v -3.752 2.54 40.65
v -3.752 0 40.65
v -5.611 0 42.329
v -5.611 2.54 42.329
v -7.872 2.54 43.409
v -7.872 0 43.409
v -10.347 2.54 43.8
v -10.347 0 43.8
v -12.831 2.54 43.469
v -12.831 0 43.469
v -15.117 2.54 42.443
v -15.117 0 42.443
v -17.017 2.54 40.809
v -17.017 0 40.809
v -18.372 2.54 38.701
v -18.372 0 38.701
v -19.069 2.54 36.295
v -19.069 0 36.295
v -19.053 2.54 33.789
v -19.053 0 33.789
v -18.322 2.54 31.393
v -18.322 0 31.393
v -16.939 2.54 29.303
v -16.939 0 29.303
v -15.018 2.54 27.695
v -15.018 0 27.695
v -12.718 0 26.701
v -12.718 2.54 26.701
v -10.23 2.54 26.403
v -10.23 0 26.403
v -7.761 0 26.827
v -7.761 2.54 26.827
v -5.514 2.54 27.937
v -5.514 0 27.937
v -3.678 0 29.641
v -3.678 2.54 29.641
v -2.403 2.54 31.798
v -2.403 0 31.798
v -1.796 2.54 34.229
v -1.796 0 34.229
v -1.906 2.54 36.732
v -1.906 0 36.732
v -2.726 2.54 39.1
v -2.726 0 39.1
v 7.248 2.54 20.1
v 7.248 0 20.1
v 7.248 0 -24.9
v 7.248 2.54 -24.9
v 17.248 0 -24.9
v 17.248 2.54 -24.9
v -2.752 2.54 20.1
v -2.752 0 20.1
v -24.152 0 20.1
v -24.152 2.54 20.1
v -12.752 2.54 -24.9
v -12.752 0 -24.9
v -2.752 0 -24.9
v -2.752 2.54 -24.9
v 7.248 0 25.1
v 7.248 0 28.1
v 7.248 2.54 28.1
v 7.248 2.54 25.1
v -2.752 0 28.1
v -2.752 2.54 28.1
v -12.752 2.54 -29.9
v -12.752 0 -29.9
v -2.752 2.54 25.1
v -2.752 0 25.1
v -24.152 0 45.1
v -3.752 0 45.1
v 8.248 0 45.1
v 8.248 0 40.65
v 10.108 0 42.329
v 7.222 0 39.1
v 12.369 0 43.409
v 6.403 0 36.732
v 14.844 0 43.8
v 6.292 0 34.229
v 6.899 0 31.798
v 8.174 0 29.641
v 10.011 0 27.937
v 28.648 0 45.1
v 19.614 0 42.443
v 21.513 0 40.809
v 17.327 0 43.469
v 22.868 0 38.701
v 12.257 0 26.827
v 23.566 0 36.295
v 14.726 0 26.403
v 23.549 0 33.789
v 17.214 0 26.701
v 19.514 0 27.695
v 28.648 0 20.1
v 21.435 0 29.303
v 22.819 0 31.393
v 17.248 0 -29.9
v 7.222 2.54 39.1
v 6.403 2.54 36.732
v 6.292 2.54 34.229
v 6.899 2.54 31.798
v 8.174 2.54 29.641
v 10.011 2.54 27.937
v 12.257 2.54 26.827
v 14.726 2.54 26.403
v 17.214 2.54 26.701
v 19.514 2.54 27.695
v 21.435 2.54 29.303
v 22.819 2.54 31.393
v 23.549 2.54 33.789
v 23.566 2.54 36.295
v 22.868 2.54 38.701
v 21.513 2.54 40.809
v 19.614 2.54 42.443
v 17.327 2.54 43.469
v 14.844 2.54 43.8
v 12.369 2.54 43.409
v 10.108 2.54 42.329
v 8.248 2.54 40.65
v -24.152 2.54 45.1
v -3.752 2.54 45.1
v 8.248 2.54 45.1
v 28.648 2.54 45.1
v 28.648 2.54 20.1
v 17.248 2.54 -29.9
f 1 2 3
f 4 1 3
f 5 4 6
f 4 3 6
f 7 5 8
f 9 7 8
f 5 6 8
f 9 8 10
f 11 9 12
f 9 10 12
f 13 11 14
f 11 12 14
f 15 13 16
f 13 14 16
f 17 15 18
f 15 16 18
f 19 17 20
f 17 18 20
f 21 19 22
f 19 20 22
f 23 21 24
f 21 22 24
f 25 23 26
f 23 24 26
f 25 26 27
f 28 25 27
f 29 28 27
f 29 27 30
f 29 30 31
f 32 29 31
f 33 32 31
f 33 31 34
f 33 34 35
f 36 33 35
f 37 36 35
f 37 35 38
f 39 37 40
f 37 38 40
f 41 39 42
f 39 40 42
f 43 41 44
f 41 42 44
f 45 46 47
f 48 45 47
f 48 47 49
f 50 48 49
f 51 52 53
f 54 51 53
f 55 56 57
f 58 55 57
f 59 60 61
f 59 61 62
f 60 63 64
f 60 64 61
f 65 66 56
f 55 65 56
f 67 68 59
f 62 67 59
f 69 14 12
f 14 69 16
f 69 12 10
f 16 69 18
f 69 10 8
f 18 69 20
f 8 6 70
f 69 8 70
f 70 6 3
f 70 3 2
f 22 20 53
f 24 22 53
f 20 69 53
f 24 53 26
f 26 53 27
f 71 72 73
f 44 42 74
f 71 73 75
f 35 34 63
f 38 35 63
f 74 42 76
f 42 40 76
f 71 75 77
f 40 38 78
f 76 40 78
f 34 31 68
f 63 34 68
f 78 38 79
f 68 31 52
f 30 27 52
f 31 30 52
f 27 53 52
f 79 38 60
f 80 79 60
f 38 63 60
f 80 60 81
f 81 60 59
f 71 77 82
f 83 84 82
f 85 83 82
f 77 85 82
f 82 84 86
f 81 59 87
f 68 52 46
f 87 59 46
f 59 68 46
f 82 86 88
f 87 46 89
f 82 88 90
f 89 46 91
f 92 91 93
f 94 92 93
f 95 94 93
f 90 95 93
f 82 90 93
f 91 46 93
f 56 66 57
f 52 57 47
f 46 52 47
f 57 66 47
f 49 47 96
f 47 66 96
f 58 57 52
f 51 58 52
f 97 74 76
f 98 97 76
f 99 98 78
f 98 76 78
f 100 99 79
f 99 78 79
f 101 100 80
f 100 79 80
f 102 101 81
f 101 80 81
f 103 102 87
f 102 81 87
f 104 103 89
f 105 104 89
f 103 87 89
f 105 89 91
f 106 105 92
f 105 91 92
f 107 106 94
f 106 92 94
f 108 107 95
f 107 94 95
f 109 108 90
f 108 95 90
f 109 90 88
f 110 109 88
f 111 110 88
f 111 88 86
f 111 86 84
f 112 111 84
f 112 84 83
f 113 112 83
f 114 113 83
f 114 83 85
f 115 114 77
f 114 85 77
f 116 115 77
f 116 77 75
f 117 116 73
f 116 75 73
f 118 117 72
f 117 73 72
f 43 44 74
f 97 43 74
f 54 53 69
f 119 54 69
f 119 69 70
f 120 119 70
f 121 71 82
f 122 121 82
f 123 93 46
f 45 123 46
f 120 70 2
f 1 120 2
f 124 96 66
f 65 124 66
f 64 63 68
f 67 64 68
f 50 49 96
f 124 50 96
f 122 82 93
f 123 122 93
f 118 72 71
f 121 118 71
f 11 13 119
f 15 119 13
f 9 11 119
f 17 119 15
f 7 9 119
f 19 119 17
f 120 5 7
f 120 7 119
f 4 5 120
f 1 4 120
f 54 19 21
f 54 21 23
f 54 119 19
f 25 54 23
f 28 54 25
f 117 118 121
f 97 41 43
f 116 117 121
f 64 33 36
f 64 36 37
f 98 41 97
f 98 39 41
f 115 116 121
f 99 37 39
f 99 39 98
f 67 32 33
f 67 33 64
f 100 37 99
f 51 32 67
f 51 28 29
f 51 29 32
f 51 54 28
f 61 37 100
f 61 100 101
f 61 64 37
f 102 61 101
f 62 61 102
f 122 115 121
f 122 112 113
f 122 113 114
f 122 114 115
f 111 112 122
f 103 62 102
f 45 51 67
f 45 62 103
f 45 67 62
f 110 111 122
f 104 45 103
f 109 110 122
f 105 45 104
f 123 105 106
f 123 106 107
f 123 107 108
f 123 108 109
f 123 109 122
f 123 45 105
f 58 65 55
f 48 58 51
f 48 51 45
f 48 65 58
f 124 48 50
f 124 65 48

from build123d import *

# Parameters (mm, degrees)
SKETCH1_W           = 10
SKETCH1_H           = 3
BOSS_EXTRUDE2_DEPTH = 2.54


with BuildPart() as part:
    # Sketch1 → Boss-Extrude2 (new body)
    with BuildSketch(Plane(origin=(0, 0, 0), x_dir=(1, 0, 0), z_dir=(0, 1, 0))):
        with BuildLine():
            Line((-12.751841201, 24.899770263), (-2.751841201, 24.899770263))
            Line((-2.751841201, 24.899770263), (-2.751841201, -20.100229737))
            Line((-2.751841201, -20.100229737), (-24.151841201, -20.100229737))
            Line((-24.151841201, -20.100229737), (-24.151841201, -45.100229737))
            Line((-24.151841201, -45.100229737), (-3.751841201, -45.100229737))
            Line((-3.751841201, -45.100229737), (-3.751841201, -40.650004508))
            ThreePointArc((-3.751841201, -40.650004508), (-17.706309974, -30.297867525), (-2.725910836, -39.100229737))
            Line((-2.725910836, -39.100229737), (7.222228435, -39.100229737))
            ThreePointArc((7.222228435, -39.100229737), (22.202627573, -30.297867525), (8.248158799, -40.650004508))
            Line((8.248158799, -40.650004508), (8.248158799, -45.100229737))
            Line((8.248158799, -45.100229737), (28.648158799, -45.100229737))
            Line((28.648158799, -45.100229737), (28.648158799, -20.100229737))
            Line((28.648158799, -20.100229737), (7.248158799, -20.100229737))
            Line((7.248158799, -20.100229737), (7.248158799, 24.899770263))
            Line((7.248158799, 24.899770263), (17.248158799, 24.899770263))
            Line((17.248158799, 24.899770263), (17.248158799, 29.899770263))
            Line((17.248158799, 29.899770263), (-12.751841201, 29.899770263))
            Line((-12.751841201, 29.899770263), (-12.751841201, 24.899770263))
        make_face()
        with Locations((2.248158799, -26.600229737)):
            Rectangle(SKETCH1_W, SKETCH1_H, mode=Mode.SUBTRACT)
    extrude(amount=BOSS_EXTRUDE2_DEPTH)


solid = part.part
